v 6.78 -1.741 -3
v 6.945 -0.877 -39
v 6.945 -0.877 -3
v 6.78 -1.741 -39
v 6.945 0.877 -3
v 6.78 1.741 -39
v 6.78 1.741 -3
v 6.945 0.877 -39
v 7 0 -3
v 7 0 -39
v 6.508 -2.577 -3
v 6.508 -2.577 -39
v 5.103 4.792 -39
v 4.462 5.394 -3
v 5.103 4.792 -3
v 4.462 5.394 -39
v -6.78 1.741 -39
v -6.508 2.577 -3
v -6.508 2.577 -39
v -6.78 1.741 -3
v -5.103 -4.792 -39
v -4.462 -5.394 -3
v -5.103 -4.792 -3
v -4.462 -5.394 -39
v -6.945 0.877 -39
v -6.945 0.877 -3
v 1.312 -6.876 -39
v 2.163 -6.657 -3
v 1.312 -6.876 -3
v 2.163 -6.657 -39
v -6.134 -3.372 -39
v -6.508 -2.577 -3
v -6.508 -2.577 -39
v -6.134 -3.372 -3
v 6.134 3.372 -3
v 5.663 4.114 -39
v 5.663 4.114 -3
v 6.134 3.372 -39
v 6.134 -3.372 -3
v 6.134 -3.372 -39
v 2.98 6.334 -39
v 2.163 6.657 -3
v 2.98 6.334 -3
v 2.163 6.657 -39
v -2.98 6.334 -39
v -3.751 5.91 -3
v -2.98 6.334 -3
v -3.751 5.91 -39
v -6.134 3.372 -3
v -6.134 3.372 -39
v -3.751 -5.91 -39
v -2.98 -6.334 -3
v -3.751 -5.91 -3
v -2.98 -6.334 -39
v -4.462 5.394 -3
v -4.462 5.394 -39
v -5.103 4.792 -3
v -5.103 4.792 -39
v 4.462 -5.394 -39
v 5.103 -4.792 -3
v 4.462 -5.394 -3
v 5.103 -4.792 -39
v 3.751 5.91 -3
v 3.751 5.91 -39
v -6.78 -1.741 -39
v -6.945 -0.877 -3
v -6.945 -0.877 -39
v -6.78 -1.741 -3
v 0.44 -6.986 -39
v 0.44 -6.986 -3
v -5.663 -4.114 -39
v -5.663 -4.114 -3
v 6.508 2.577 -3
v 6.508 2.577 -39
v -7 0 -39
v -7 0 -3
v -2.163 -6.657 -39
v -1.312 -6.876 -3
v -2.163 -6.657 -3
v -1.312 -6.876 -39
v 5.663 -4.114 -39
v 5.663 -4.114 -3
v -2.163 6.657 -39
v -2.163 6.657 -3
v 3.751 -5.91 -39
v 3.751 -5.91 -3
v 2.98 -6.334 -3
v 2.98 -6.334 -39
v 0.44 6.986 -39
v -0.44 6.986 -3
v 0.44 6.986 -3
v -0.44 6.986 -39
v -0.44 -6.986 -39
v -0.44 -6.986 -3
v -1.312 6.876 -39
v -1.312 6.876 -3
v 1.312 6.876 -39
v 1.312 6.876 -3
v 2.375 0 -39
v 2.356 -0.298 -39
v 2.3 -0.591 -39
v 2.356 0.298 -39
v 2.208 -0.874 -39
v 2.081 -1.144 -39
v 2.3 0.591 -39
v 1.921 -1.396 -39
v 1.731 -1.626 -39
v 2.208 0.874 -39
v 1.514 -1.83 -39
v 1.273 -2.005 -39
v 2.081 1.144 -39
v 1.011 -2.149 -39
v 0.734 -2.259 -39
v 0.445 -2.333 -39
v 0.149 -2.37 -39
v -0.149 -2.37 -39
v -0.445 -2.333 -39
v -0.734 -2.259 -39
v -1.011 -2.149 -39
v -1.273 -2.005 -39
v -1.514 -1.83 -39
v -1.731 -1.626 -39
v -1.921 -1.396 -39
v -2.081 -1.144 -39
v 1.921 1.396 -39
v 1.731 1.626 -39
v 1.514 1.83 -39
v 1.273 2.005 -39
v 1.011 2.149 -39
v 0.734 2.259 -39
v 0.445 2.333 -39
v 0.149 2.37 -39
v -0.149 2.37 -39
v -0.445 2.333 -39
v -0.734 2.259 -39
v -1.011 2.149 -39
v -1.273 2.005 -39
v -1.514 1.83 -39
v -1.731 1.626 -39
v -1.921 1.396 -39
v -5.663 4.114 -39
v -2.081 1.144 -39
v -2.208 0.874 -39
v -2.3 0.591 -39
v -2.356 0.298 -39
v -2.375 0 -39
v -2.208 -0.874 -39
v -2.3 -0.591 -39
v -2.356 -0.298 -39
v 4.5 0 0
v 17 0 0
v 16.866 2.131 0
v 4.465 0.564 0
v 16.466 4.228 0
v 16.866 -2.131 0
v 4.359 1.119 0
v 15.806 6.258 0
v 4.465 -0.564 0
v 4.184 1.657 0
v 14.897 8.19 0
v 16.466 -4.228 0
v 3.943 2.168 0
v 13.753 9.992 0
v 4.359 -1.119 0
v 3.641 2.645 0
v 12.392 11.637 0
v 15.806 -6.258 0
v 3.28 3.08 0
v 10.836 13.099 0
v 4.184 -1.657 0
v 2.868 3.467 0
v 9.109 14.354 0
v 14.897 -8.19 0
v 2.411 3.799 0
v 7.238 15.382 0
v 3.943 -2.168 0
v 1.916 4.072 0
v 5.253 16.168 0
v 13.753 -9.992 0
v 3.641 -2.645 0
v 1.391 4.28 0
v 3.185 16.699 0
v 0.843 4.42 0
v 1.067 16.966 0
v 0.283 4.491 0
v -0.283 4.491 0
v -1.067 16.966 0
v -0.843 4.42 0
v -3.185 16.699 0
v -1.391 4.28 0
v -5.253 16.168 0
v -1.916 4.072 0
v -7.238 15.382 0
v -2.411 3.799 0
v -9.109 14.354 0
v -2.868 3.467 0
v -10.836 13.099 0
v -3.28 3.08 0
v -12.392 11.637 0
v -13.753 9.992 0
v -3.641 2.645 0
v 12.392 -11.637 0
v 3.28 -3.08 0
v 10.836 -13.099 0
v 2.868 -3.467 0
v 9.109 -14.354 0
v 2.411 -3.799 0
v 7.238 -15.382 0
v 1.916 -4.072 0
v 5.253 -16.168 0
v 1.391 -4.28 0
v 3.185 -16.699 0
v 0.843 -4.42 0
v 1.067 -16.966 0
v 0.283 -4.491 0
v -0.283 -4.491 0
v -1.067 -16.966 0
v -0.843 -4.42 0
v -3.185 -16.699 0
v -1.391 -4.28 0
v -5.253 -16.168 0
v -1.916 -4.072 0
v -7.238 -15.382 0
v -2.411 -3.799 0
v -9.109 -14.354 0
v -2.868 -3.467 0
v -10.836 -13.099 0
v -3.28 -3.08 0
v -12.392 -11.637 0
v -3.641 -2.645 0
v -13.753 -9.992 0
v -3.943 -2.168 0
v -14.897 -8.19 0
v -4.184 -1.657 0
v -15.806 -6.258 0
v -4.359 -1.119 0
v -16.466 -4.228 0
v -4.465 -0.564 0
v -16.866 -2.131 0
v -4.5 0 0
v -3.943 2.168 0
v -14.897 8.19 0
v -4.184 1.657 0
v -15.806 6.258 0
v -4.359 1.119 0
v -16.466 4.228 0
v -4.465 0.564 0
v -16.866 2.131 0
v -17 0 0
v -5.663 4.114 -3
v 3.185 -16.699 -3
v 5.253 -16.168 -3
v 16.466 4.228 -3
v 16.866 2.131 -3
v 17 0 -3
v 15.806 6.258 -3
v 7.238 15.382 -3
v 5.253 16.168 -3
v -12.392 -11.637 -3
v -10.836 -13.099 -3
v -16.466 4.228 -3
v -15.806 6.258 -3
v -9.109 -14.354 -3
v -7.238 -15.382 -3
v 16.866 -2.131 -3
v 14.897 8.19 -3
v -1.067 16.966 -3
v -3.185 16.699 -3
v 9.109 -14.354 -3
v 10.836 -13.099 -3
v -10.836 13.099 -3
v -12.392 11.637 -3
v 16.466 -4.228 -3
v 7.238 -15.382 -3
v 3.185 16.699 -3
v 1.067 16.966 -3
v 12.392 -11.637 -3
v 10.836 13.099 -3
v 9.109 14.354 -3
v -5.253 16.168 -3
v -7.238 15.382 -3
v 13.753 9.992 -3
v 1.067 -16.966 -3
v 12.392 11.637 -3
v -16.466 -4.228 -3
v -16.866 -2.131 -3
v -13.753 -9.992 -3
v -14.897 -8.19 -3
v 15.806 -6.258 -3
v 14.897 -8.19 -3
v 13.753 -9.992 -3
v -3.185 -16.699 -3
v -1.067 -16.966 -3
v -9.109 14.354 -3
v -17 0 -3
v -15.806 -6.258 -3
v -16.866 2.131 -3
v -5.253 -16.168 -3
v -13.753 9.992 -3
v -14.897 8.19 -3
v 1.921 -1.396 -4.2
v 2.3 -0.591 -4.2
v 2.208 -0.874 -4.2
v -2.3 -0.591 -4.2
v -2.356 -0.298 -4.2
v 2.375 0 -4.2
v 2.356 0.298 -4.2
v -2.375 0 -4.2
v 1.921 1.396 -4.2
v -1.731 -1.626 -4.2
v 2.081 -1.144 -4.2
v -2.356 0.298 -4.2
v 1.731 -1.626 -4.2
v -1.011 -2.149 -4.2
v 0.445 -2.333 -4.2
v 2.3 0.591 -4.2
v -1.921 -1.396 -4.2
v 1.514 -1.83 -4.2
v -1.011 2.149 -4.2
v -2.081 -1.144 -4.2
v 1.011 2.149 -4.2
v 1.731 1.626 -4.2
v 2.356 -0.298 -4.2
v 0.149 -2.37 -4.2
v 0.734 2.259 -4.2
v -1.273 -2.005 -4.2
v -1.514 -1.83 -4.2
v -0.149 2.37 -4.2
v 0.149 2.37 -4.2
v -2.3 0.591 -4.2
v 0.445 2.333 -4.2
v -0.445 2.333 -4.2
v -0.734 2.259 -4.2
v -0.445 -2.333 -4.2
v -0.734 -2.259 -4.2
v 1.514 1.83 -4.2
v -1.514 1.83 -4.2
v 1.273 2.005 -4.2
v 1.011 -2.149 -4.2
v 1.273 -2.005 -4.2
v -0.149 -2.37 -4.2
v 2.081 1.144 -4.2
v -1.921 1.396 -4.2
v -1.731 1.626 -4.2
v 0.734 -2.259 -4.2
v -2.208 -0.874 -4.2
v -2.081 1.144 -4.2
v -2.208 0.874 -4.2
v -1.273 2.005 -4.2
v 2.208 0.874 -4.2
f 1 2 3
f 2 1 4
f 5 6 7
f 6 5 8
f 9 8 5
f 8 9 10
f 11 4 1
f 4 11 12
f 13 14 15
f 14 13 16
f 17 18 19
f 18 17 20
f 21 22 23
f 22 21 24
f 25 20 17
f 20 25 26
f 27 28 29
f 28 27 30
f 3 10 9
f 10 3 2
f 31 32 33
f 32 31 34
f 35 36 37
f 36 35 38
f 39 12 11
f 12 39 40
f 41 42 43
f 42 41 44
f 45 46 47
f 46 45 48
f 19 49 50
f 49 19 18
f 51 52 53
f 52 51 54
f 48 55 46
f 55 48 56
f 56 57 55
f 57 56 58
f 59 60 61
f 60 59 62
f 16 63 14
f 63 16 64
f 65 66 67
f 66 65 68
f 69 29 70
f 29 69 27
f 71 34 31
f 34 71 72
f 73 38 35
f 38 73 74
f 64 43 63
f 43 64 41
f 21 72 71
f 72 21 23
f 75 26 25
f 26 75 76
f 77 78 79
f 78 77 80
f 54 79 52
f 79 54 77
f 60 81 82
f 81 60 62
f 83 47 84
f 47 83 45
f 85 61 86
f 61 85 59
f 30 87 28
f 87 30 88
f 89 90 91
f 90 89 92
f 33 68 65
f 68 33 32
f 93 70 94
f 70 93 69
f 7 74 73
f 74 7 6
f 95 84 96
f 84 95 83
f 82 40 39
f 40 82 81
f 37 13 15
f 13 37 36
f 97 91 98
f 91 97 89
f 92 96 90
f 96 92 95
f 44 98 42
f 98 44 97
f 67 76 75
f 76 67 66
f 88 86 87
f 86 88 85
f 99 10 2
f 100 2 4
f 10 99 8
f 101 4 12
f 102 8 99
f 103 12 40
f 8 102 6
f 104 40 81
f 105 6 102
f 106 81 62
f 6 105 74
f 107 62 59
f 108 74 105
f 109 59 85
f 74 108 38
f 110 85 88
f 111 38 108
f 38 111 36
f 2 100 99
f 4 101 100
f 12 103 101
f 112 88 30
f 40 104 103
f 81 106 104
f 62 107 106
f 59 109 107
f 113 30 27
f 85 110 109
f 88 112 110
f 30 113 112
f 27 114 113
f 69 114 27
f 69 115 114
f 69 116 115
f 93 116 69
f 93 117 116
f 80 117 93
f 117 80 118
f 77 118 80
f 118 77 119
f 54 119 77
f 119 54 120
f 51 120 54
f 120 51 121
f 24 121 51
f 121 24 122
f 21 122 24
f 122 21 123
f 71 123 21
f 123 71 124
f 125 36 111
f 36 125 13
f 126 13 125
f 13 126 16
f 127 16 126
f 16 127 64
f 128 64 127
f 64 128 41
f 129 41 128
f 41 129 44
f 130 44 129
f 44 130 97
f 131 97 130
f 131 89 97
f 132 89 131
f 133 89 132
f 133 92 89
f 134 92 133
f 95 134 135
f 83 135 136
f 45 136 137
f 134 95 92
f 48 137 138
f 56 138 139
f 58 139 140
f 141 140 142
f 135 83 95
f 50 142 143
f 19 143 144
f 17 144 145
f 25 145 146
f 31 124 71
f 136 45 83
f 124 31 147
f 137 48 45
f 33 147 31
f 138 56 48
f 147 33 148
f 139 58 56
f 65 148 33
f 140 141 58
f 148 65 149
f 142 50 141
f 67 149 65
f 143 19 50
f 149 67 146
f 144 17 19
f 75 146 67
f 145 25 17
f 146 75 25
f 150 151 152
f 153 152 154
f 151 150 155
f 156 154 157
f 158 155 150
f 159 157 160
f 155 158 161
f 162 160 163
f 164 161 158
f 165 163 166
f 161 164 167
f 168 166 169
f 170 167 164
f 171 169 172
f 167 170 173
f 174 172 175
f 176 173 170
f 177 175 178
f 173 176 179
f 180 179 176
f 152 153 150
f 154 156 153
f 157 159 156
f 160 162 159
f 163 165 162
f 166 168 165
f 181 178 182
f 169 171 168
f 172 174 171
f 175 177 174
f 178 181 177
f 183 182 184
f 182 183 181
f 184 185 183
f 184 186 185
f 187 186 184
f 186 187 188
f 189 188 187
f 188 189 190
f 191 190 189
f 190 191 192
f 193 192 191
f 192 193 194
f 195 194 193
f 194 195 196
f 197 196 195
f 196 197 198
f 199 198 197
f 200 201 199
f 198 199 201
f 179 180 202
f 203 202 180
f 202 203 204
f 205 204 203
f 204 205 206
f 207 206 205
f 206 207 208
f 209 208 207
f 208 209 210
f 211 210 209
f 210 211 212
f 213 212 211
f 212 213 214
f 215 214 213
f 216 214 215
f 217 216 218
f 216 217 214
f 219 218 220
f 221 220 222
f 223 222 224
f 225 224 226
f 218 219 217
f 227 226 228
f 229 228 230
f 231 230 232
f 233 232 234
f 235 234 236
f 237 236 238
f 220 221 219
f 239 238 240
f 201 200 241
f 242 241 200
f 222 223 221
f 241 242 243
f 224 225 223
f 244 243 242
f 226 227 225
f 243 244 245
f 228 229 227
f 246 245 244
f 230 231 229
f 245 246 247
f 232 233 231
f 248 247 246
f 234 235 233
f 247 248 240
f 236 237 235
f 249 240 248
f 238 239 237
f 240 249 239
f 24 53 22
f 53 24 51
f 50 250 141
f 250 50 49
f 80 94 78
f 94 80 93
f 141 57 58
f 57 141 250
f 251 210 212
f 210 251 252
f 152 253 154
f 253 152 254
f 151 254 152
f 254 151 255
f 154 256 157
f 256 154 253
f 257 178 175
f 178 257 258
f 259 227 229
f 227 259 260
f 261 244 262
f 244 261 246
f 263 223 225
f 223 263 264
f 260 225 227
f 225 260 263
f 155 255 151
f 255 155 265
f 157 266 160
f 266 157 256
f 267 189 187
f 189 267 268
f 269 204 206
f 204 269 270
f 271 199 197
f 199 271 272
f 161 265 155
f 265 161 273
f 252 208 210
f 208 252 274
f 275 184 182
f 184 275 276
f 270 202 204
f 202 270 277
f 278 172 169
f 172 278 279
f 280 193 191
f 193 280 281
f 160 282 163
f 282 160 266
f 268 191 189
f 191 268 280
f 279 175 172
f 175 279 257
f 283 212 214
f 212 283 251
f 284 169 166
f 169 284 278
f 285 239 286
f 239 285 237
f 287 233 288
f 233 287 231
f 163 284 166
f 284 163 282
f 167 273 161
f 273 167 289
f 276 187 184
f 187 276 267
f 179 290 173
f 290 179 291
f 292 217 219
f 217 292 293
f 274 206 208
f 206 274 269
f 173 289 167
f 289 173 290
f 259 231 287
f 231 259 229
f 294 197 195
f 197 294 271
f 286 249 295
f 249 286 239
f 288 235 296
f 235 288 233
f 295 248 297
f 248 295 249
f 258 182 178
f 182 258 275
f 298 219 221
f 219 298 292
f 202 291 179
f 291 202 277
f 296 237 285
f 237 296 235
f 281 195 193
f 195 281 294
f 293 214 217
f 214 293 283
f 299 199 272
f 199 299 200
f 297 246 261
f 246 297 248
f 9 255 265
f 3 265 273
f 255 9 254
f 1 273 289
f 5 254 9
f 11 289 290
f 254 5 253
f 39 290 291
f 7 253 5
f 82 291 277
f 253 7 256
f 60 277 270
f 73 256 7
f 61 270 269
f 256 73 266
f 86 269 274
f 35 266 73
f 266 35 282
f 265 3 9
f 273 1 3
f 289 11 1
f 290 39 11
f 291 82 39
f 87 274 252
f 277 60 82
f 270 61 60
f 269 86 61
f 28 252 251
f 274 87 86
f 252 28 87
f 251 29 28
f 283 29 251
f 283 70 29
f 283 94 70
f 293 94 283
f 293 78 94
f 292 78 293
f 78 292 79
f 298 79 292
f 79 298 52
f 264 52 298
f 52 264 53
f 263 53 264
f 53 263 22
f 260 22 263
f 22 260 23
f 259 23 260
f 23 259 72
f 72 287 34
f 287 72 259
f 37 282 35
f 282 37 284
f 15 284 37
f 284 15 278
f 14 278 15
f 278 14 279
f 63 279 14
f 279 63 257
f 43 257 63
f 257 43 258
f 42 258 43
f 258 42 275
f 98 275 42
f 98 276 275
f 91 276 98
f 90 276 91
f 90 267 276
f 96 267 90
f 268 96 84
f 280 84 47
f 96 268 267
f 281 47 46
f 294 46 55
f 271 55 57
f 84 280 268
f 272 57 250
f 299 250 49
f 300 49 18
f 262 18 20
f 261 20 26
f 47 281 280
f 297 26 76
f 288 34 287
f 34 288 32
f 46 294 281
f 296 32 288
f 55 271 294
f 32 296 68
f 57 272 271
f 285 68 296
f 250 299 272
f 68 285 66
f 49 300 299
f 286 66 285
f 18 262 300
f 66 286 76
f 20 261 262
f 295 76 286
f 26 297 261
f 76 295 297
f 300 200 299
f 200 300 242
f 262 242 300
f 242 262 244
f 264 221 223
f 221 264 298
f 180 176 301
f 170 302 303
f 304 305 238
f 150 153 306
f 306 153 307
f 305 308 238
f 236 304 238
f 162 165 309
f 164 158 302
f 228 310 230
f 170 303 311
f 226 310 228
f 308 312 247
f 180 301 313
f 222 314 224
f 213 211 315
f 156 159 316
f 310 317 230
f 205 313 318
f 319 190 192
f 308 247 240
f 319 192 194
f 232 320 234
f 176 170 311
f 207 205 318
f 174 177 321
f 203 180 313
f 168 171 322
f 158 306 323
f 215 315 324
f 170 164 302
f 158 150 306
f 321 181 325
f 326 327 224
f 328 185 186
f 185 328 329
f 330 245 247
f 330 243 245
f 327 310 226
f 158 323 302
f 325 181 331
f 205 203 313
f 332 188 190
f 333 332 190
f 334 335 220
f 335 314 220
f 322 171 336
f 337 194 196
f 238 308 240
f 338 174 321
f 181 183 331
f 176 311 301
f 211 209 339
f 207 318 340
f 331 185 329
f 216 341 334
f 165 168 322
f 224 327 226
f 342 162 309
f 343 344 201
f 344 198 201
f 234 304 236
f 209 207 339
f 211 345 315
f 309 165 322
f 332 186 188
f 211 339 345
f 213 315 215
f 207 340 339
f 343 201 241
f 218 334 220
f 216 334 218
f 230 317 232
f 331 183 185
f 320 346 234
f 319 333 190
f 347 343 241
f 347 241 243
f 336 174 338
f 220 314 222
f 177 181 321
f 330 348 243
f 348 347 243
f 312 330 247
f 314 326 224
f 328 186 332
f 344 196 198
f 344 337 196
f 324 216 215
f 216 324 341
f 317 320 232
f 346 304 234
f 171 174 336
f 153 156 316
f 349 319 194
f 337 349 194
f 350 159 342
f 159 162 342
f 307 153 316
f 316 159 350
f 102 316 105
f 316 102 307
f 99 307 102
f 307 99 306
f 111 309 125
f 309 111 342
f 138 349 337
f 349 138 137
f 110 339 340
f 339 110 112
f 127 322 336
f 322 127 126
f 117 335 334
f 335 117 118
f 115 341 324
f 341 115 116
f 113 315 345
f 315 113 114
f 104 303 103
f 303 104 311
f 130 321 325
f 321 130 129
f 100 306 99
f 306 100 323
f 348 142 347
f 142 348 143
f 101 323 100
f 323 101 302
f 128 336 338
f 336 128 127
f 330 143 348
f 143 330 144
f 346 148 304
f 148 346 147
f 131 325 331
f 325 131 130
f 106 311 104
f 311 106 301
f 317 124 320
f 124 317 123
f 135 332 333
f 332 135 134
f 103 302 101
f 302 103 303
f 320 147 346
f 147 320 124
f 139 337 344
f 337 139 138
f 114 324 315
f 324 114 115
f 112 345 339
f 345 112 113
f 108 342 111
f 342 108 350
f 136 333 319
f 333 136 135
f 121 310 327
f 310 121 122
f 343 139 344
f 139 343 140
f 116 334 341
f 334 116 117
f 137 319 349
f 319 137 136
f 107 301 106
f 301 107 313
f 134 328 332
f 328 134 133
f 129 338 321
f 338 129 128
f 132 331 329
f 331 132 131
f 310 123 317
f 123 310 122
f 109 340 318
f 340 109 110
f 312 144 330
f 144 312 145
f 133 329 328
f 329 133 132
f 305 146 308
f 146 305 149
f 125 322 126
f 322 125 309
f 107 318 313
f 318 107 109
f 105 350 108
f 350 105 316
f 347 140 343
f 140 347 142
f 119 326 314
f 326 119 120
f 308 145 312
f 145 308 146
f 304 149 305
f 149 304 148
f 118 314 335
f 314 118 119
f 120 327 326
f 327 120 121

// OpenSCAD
$fn = 50;


difference() {
	union() {
		translate(v = [0, 0, -39.0000000000]) {
			cylinder(h = 39, r = 7.0000000000);
		}
		translate(v = [0, 0, -3.0000000000]) {
			cylinder(h = 3, r = 17.0000000000);
		}
	}
	union() {
		translate(v = [0, 0, 0]) {
			rotate(a = [0, 0, 0]) {
				difference() {
					union() {
						#translate(v = [0, 0, -39.0000000000]) {
							cylinder(h = 39, r = 2.2500000000);
						}
						#translate(v = [0, 0, -4.2000000000]) {
							cylinder(h = 4.2000000000, r1 = 2.3750000000, r2 = 4.5000000000);
						}
						#translate(v = [0, 0, -39.0000000000]) {
							cylinder(h = 39, r = 2.3750000000);
						}
						#translate(v = [0, 0, -39.0000000000]) {
							cylinder(h = 39, r = 2.2500000000);
						}
					}
					union();
				}
			}
		}
	}
}
